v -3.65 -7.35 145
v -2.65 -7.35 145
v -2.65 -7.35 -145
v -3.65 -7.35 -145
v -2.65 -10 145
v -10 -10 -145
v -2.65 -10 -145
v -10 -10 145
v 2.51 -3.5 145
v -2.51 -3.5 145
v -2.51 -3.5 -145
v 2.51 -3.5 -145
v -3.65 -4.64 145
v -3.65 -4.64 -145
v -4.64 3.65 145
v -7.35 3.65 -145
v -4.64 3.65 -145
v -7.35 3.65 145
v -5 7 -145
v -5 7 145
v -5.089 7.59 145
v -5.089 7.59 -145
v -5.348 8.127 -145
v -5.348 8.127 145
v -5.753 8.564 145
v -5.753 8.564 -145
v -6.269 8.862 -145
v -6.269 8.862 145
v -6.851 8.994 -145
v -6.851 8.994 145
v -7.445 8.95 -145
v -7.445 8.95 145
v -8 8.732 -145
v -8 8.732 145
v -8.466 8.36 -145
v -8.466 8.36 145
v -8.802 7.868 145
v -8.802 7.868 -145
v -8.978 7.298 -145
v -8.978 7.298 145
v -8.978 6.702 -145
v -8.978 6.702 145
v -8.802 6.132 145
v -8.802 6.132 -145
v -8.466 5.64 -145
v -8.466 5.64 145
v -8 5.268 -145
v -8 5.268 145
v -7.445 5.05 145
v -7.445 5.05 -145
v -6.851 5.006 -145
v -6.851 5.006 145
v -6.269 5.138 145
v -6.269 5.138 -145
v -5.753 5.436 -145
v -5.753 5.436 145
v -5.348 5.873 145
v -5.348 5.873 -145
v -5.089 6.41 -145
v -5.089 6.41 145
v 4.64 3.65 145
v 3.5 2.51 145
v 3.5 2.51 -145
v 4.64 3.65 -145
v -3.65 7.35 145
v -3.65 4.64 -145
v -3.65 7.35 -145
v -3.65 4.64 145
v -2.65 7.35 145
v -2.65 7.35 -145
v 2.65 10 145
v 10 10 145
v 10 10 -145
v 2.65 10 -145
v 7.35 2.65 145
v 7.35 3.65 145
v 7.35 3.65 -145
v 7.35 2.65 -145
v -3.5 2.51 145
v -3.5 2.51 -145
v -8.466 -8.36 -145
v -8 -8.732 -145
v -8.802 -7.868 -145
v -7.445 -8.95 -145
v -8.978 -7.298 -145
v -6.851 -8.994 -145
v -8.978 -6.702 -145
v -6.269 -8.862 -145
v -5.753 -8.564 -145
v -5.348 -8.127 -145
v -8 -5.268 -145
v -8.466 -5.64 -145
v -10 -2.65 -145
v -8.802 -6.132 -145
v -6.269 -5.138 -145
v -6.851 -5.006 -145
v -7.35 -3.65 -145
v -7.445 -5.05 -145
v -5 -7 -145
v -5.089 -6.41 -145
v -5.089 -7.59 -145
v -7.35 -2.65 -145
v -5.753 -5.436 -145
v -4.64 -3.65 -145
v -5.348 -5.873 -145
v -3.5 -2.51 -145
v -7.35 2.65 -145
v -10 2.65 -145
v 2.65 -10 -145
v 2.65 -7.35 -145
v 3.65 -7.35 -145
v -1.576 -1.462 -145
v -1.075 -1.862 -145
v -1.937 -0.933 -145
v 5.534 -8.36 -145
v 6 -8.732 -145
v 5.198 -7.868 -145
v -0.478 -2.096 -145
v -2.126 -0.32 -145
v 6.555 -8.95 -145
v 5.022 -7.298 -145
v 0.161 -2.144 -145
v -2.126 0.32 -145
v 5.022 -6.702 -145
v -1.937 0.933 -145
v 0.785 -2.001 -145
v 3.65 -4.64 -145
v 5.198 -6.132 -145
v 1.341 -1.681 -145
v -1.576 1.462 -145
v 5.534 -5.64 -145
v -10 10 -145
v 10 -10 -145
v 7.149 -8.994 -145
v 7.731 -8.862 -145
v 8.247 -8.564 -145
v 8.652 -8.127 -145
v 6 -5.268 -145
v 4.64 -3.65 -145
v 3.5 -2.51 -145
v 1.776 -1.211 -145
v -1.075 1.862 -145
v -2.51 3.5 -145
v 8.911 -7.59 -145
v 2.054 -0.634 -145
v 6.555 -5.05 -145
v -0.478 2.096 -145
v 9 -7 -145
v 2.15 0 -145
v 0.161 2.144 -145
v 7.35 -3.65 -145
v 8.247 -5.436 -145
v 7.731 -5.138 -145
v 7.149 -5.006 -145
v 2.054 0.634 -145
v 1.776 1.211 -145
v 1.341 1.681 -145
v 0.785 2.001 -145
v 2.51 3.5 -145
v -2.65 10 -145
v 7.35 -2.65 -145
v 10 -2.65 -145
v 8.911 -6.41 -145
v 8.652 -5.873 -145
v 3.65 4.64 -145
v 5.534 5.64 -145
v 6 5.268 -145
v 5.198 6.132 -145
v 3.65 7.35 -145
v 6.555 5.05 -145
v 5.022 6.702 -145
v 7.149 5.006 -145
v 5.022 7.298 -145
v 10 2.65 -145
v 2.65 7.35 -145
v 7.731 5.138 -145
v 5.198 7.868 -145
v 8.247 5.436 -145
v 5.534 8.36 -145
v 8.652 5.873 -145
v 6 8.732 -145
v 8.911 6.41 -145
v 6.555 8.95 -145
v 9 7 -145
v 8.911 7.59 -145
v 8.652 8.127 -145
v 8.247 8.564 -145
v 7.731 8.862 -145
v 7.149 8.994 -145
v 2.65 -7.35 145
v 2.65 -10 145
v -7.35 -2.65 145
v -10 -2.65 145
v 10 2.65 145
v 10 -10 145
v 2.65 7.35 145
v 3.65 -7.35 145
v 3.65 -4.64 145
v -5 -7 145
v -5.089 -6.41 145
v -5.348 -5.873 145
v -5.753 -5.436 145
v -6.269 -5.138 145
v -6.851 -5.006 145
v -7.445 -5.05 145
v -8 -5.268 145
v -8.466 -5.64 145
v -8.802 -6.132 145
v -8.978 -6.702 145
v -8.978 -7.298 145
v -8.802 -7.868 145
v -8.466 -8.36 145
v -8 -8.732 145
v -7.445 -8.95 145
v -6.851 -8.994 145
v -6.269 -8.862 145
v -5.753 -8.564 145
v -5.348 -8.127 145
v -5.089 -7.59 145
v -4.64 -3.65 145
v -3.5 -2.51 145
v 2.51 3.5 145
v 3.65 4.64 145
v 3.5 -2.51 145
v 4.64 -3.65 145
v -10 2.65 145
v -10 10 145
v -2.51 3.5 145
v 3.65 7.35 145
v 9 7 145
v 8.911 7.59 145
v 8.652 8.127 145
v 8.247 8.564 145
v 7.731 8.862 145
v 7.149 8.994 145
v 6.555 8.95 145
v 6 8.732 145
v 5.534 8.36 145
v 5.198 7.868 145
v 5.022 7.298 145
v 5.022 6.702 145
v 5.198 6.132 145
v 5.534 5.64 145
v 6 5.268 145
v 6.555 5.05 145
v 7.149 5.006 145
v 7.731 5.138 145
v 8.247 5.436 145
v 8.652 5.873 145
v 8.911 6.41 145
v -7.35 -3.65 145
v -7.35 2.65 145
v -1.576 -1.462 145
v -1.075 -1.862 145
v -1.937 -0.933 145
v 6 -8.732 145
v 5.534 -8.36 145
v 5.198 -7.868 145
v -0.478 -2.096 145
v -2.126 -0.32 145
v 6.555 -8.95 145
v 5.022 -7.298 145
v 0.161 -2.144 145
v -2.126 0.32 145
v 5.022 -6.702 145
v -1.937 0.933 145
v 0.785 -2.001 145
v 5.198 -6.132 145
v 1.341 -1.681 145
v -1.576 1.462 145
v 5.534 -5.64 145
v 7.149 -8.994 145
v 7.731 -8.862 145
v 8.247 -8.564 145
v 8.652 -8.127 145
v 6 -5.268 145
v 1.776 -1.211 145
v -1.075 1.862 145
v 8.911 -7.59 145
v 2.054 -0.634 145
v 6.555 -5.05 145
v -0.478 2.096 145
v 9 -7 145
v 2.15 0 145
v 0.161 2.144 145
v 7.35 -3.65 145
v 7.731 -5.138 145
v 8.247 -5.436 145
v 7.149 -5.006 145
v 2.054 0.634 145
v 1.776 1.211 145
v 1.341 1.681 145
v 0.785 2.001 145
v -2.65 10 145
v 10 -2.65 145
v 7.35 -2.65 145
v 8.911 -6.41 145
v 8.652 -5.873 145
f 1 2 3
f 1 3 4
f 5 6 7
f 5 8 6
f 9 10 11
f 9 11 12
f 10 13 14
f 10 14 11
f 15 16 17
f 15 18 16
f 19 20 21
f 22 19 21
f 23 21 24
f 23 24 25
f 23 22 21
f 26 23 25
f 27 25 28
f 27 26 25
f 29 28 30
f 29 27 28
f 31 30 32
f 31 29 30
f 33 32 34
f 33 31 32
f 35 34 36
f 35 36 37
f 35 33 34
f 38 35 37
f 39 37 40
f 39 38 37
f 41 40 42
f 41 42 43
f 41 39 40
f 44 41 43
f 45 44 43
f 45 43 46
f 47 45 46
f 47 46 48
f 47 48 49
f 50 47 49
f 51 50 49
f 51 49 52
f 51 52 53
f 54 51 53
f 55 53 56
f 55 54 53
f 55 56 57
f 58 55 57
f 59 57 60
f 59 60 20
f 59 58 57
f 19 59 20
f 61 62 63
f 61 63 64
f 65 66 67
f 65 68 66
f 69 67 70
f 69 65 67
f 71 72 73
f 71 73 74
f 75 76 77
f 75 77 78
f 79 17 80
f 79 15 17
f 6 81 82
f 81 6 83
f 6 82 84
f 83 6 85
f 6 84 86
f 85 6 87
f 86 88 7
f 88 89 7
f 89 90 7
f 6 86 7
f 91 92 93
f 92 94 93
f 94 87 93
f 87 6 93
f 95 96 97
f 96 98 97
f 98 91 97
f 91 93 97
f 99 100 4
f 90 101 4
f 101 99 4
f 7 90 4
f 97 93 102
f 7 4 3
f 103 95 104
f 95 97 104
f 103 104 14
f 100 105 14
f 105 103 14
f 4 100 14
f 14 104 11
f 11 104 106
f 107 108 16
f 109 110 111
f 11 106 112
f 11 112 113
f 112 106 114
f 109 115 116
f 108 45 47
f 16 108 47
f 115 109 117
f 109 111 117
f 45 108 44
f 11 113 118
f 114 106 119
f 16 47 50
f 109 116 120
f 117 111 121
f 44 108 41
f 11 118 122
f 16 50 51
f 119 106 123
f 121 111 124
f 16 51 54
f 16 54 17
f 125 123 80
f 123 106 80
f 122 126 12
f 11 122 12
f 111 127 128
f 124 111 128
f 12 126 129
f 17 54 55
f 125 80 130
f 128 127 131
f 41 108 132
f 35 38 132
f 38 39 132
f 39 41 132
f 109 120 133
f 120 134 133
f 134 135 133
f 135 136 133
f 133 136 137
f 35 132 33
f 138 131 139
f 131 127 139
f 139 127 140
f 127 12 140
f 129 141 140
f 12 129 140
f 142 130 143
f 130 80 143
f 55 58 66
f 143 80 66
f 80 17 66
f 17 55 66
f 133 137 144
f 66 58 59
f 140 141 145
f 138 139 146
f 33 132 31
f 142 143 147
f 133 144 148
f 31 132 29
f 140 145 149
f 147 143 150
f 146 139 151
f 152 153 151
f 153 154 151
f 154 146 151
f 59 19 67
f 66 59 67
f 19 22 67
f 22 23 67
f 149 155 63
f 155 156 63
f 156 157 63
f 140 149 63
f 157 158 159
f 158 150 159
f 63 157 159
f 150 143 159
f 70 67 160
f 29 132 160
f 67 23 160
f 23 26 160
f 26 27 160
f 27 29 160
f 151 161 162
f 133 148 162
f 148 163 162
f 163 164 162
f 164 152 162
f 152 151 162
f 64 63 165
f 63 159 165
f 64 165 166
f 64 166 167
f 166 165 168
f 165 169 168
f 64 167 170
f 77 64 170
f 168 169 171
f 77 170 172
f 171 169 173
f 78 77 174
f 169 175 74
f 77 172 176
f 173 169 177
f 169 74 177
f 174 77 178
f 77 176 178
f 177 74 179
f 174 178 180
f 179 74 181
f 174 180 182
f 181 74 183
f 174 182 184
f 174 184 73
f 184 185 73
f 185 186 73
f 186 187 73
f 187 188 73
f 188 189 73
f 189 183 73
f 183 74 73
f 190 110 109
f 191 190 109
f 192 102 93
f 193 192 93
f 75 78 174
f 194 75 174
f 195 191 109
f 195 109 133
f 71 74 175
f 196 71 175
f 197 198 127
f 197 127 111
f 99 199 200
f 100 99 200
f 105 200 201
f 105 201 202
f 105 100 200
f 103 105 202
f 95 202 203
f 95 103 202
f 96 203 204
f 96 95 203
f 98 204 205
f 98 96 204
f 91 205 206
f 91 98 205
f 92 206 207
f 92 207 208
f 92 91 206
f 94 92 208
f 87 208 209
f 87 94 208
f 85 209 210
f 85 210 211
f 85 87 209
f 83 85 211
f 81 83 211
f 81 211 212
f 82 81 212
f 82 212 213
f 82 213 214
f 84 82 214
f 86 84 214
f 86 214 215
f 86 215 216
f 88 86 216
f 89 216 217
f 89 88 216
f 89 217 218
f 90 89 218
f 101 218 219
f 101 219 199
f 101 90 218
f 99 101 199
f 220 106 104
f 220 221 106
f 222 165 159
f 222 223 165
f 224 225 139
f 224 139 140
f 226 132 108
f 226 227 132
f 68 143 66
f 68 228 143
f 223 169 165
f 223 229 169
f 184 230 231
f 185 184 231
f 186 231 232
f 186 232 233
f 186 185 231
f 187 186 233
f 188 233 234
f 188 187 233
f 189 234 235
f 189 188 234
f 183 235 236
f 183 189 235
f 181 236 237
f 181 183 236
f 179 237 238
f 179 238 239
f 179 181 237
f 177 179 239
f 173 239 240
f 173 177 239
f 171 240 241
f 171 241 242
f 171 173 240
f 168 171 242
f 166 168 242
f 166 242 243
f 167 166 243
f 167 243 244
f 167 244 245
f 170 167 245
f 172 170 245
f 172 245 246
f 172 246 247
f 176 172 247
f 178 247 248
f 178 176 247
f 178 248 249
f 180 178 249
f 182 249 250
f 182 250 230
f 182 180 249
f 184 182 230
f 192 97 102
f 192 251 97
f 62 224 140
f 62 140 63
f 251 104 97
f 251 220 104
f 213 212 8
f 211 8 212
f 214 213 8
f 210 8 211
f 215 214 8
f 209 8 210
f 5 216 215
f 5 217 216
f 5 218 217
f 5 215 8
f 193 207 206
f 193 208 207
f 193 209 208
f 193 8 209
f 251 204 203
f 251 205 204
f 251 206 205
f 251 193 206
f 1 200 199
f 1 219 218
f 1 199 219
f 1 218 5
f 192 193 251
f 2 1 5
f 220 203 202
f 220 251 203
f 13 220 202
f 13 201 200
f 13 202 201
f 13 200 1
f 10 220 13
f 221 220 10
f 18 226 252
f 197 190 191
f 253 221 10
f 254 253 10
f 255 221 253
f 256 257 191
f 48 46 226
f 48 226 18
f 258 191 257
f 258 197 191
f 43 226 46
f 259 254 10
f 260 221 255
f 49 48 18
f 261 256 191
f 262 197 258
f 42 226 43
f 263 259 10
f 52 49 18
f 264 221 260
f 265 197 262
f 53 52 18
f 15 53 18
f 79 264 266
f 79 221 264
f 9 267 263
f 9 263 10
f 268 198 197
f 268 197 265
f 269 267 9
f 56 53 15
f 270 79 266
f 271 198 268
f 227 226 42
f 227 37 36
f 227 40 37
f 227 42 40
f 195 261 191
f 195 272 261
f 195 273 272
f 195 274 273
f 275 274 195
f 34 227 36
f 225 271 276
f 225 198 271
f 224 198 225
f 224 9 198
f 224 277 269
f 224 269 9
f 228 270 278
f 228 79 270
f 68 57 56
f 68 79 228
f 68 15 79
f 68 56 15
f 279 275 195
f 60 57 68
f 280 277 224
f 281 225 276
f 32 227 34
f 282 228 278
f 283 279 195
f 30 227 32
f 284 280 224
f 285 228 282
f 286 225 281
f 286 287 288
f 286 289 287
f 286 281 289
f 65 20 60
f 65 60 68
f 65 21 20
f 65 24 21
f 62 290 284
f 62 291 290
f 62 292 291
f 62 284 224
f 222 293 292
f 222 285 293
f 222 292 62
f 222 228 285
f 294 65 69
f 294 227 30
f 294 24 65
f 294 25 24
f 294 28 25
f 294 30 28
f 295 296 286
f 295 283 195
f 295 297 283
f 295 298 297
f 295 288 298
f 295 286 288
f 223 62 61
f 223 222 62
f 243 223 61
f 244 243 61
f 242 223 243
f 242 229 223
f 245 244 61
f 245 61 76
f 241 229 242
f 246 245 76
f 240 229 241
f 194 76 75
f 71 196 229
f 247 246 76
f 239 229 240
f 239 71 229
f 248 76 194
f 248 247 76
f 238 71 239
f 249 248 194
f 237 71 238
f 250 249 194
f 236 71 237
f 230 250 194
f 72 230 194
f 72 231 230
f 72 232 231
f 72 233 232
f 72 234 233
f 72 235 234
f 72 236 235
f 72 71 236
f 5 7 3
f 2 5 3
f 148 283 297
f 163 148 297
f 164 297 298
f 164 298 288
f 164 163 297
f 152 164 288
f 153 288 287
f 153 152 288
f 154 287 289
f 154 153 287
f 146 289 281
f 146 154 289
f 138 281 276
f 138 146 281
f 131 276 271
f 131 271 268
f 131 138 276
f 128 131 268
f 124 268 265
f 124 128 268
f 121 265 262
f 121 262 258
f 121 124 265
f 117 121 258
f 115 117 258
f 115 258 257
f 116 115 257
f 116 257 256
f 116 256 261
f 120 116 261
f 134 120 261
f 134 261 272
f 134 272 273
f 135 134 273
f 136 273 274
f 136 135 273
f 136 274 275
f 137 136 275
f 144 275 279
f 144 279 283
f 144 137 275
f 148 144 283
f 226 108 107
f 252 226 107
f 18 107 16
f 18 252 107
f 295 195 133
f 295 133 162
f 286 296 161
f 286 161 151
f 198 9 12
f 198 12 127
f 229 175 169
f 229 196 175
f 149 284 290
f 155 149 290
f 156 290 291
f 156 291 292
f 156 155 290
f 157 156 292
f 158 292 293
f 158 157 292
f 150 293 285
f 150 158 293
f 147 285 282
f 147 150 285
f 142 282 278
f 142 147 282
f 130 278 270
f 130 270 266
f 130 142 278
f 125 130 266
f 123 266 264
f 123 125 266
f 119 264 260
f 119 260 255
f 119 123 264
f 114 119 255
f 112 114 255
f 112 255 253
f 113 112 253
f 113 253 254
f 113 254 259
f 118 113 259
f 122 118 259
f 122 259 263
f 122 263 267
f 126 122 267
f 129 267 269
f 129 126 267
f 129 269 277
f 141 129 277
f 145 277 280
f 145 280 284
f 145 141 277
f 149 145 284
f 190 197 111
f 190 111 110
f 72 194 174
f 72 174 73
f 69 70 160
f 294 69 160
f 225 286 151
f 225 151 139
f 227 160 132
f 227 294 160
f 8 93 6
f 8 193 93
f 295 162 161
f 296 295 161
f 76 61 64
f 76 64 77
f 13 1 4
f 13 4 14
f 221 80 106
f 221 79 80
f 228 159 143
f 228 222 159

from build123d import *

# Parameters (mm, degrees)
SKETCH_1_R      = 2
SKETCH_1_R_2    = 2.15
EXTRUDE_1_DEPTH = 145


with BuildPart() as part:
    # 스케치1 → 보스-돌출1 (new, symmetric)
    with BuildSketch(Plane.XY):
        Polygon((-10, -10), (-2.65, -10), (-2.65, -7.35), (-3.65, -7.35), (-3.65, -4.639949494), (-2.510050506, -3.5), (0, -3.5), (2.510050506, -3.5), (3.65, -4.639949494), (3.65, -7.35), (2.65, -7.35), (2.65, -10), (10, -10), (10, -2.65), (7.35, -2.65), (7.35, -3.65), (4.639949494, -3.65), (3.5, -2.510050506), (3.5, 0), (3.5, 2.510050506), (4.639949494, 3.65), (7.35, 3.65), (7.35, 2.65), (10, 2.65), (10, 10), (2.65, 10), (2.65, 7.35), (3.65, 7.35), (3.65, 4.639949494), (2.510050506, 3.5), (0, 3.5), (-2.510050506, 3.5), (-3.65, 4.639949494), (-3.65, 7.35), (-2.65, 7.35), (-2.65, 10), (-10, 10), (-10, 2.65), (-7.35, 2.65), (-7.35, 3.65), (-4.639949494, 3.65), (-3.5, 2.510050506), (-3.5, 0), (-3.5, -2.510050506), (-4.639949494, -3.65), (-7.35, -3.65), (-7.35, -2.65), (-10, -2.65), align=None)
        with Locations((-7, 7)):
            Circle(SKETCH_1_R, mode=Mode.SUBTRACT)
        Circle(SKETCH_1_R_2, mode=Mode.SUBTRACT)
        with Locations((7, 7)):
            Circle(SKETCH_1_R, mode=Mode.SUBTRACT)
        with Locations((-7, -7)):
            Circle(SKETCH_1_R, mode=Mode.SUBTRACT)
        with Locations((7, -7)):
            Circle(SKETCH_1_R, mode=Mode.SUBTRACT)
    extrude(amount=EXTRUDE_1_DEPTH, both=True)


solid = part.part
